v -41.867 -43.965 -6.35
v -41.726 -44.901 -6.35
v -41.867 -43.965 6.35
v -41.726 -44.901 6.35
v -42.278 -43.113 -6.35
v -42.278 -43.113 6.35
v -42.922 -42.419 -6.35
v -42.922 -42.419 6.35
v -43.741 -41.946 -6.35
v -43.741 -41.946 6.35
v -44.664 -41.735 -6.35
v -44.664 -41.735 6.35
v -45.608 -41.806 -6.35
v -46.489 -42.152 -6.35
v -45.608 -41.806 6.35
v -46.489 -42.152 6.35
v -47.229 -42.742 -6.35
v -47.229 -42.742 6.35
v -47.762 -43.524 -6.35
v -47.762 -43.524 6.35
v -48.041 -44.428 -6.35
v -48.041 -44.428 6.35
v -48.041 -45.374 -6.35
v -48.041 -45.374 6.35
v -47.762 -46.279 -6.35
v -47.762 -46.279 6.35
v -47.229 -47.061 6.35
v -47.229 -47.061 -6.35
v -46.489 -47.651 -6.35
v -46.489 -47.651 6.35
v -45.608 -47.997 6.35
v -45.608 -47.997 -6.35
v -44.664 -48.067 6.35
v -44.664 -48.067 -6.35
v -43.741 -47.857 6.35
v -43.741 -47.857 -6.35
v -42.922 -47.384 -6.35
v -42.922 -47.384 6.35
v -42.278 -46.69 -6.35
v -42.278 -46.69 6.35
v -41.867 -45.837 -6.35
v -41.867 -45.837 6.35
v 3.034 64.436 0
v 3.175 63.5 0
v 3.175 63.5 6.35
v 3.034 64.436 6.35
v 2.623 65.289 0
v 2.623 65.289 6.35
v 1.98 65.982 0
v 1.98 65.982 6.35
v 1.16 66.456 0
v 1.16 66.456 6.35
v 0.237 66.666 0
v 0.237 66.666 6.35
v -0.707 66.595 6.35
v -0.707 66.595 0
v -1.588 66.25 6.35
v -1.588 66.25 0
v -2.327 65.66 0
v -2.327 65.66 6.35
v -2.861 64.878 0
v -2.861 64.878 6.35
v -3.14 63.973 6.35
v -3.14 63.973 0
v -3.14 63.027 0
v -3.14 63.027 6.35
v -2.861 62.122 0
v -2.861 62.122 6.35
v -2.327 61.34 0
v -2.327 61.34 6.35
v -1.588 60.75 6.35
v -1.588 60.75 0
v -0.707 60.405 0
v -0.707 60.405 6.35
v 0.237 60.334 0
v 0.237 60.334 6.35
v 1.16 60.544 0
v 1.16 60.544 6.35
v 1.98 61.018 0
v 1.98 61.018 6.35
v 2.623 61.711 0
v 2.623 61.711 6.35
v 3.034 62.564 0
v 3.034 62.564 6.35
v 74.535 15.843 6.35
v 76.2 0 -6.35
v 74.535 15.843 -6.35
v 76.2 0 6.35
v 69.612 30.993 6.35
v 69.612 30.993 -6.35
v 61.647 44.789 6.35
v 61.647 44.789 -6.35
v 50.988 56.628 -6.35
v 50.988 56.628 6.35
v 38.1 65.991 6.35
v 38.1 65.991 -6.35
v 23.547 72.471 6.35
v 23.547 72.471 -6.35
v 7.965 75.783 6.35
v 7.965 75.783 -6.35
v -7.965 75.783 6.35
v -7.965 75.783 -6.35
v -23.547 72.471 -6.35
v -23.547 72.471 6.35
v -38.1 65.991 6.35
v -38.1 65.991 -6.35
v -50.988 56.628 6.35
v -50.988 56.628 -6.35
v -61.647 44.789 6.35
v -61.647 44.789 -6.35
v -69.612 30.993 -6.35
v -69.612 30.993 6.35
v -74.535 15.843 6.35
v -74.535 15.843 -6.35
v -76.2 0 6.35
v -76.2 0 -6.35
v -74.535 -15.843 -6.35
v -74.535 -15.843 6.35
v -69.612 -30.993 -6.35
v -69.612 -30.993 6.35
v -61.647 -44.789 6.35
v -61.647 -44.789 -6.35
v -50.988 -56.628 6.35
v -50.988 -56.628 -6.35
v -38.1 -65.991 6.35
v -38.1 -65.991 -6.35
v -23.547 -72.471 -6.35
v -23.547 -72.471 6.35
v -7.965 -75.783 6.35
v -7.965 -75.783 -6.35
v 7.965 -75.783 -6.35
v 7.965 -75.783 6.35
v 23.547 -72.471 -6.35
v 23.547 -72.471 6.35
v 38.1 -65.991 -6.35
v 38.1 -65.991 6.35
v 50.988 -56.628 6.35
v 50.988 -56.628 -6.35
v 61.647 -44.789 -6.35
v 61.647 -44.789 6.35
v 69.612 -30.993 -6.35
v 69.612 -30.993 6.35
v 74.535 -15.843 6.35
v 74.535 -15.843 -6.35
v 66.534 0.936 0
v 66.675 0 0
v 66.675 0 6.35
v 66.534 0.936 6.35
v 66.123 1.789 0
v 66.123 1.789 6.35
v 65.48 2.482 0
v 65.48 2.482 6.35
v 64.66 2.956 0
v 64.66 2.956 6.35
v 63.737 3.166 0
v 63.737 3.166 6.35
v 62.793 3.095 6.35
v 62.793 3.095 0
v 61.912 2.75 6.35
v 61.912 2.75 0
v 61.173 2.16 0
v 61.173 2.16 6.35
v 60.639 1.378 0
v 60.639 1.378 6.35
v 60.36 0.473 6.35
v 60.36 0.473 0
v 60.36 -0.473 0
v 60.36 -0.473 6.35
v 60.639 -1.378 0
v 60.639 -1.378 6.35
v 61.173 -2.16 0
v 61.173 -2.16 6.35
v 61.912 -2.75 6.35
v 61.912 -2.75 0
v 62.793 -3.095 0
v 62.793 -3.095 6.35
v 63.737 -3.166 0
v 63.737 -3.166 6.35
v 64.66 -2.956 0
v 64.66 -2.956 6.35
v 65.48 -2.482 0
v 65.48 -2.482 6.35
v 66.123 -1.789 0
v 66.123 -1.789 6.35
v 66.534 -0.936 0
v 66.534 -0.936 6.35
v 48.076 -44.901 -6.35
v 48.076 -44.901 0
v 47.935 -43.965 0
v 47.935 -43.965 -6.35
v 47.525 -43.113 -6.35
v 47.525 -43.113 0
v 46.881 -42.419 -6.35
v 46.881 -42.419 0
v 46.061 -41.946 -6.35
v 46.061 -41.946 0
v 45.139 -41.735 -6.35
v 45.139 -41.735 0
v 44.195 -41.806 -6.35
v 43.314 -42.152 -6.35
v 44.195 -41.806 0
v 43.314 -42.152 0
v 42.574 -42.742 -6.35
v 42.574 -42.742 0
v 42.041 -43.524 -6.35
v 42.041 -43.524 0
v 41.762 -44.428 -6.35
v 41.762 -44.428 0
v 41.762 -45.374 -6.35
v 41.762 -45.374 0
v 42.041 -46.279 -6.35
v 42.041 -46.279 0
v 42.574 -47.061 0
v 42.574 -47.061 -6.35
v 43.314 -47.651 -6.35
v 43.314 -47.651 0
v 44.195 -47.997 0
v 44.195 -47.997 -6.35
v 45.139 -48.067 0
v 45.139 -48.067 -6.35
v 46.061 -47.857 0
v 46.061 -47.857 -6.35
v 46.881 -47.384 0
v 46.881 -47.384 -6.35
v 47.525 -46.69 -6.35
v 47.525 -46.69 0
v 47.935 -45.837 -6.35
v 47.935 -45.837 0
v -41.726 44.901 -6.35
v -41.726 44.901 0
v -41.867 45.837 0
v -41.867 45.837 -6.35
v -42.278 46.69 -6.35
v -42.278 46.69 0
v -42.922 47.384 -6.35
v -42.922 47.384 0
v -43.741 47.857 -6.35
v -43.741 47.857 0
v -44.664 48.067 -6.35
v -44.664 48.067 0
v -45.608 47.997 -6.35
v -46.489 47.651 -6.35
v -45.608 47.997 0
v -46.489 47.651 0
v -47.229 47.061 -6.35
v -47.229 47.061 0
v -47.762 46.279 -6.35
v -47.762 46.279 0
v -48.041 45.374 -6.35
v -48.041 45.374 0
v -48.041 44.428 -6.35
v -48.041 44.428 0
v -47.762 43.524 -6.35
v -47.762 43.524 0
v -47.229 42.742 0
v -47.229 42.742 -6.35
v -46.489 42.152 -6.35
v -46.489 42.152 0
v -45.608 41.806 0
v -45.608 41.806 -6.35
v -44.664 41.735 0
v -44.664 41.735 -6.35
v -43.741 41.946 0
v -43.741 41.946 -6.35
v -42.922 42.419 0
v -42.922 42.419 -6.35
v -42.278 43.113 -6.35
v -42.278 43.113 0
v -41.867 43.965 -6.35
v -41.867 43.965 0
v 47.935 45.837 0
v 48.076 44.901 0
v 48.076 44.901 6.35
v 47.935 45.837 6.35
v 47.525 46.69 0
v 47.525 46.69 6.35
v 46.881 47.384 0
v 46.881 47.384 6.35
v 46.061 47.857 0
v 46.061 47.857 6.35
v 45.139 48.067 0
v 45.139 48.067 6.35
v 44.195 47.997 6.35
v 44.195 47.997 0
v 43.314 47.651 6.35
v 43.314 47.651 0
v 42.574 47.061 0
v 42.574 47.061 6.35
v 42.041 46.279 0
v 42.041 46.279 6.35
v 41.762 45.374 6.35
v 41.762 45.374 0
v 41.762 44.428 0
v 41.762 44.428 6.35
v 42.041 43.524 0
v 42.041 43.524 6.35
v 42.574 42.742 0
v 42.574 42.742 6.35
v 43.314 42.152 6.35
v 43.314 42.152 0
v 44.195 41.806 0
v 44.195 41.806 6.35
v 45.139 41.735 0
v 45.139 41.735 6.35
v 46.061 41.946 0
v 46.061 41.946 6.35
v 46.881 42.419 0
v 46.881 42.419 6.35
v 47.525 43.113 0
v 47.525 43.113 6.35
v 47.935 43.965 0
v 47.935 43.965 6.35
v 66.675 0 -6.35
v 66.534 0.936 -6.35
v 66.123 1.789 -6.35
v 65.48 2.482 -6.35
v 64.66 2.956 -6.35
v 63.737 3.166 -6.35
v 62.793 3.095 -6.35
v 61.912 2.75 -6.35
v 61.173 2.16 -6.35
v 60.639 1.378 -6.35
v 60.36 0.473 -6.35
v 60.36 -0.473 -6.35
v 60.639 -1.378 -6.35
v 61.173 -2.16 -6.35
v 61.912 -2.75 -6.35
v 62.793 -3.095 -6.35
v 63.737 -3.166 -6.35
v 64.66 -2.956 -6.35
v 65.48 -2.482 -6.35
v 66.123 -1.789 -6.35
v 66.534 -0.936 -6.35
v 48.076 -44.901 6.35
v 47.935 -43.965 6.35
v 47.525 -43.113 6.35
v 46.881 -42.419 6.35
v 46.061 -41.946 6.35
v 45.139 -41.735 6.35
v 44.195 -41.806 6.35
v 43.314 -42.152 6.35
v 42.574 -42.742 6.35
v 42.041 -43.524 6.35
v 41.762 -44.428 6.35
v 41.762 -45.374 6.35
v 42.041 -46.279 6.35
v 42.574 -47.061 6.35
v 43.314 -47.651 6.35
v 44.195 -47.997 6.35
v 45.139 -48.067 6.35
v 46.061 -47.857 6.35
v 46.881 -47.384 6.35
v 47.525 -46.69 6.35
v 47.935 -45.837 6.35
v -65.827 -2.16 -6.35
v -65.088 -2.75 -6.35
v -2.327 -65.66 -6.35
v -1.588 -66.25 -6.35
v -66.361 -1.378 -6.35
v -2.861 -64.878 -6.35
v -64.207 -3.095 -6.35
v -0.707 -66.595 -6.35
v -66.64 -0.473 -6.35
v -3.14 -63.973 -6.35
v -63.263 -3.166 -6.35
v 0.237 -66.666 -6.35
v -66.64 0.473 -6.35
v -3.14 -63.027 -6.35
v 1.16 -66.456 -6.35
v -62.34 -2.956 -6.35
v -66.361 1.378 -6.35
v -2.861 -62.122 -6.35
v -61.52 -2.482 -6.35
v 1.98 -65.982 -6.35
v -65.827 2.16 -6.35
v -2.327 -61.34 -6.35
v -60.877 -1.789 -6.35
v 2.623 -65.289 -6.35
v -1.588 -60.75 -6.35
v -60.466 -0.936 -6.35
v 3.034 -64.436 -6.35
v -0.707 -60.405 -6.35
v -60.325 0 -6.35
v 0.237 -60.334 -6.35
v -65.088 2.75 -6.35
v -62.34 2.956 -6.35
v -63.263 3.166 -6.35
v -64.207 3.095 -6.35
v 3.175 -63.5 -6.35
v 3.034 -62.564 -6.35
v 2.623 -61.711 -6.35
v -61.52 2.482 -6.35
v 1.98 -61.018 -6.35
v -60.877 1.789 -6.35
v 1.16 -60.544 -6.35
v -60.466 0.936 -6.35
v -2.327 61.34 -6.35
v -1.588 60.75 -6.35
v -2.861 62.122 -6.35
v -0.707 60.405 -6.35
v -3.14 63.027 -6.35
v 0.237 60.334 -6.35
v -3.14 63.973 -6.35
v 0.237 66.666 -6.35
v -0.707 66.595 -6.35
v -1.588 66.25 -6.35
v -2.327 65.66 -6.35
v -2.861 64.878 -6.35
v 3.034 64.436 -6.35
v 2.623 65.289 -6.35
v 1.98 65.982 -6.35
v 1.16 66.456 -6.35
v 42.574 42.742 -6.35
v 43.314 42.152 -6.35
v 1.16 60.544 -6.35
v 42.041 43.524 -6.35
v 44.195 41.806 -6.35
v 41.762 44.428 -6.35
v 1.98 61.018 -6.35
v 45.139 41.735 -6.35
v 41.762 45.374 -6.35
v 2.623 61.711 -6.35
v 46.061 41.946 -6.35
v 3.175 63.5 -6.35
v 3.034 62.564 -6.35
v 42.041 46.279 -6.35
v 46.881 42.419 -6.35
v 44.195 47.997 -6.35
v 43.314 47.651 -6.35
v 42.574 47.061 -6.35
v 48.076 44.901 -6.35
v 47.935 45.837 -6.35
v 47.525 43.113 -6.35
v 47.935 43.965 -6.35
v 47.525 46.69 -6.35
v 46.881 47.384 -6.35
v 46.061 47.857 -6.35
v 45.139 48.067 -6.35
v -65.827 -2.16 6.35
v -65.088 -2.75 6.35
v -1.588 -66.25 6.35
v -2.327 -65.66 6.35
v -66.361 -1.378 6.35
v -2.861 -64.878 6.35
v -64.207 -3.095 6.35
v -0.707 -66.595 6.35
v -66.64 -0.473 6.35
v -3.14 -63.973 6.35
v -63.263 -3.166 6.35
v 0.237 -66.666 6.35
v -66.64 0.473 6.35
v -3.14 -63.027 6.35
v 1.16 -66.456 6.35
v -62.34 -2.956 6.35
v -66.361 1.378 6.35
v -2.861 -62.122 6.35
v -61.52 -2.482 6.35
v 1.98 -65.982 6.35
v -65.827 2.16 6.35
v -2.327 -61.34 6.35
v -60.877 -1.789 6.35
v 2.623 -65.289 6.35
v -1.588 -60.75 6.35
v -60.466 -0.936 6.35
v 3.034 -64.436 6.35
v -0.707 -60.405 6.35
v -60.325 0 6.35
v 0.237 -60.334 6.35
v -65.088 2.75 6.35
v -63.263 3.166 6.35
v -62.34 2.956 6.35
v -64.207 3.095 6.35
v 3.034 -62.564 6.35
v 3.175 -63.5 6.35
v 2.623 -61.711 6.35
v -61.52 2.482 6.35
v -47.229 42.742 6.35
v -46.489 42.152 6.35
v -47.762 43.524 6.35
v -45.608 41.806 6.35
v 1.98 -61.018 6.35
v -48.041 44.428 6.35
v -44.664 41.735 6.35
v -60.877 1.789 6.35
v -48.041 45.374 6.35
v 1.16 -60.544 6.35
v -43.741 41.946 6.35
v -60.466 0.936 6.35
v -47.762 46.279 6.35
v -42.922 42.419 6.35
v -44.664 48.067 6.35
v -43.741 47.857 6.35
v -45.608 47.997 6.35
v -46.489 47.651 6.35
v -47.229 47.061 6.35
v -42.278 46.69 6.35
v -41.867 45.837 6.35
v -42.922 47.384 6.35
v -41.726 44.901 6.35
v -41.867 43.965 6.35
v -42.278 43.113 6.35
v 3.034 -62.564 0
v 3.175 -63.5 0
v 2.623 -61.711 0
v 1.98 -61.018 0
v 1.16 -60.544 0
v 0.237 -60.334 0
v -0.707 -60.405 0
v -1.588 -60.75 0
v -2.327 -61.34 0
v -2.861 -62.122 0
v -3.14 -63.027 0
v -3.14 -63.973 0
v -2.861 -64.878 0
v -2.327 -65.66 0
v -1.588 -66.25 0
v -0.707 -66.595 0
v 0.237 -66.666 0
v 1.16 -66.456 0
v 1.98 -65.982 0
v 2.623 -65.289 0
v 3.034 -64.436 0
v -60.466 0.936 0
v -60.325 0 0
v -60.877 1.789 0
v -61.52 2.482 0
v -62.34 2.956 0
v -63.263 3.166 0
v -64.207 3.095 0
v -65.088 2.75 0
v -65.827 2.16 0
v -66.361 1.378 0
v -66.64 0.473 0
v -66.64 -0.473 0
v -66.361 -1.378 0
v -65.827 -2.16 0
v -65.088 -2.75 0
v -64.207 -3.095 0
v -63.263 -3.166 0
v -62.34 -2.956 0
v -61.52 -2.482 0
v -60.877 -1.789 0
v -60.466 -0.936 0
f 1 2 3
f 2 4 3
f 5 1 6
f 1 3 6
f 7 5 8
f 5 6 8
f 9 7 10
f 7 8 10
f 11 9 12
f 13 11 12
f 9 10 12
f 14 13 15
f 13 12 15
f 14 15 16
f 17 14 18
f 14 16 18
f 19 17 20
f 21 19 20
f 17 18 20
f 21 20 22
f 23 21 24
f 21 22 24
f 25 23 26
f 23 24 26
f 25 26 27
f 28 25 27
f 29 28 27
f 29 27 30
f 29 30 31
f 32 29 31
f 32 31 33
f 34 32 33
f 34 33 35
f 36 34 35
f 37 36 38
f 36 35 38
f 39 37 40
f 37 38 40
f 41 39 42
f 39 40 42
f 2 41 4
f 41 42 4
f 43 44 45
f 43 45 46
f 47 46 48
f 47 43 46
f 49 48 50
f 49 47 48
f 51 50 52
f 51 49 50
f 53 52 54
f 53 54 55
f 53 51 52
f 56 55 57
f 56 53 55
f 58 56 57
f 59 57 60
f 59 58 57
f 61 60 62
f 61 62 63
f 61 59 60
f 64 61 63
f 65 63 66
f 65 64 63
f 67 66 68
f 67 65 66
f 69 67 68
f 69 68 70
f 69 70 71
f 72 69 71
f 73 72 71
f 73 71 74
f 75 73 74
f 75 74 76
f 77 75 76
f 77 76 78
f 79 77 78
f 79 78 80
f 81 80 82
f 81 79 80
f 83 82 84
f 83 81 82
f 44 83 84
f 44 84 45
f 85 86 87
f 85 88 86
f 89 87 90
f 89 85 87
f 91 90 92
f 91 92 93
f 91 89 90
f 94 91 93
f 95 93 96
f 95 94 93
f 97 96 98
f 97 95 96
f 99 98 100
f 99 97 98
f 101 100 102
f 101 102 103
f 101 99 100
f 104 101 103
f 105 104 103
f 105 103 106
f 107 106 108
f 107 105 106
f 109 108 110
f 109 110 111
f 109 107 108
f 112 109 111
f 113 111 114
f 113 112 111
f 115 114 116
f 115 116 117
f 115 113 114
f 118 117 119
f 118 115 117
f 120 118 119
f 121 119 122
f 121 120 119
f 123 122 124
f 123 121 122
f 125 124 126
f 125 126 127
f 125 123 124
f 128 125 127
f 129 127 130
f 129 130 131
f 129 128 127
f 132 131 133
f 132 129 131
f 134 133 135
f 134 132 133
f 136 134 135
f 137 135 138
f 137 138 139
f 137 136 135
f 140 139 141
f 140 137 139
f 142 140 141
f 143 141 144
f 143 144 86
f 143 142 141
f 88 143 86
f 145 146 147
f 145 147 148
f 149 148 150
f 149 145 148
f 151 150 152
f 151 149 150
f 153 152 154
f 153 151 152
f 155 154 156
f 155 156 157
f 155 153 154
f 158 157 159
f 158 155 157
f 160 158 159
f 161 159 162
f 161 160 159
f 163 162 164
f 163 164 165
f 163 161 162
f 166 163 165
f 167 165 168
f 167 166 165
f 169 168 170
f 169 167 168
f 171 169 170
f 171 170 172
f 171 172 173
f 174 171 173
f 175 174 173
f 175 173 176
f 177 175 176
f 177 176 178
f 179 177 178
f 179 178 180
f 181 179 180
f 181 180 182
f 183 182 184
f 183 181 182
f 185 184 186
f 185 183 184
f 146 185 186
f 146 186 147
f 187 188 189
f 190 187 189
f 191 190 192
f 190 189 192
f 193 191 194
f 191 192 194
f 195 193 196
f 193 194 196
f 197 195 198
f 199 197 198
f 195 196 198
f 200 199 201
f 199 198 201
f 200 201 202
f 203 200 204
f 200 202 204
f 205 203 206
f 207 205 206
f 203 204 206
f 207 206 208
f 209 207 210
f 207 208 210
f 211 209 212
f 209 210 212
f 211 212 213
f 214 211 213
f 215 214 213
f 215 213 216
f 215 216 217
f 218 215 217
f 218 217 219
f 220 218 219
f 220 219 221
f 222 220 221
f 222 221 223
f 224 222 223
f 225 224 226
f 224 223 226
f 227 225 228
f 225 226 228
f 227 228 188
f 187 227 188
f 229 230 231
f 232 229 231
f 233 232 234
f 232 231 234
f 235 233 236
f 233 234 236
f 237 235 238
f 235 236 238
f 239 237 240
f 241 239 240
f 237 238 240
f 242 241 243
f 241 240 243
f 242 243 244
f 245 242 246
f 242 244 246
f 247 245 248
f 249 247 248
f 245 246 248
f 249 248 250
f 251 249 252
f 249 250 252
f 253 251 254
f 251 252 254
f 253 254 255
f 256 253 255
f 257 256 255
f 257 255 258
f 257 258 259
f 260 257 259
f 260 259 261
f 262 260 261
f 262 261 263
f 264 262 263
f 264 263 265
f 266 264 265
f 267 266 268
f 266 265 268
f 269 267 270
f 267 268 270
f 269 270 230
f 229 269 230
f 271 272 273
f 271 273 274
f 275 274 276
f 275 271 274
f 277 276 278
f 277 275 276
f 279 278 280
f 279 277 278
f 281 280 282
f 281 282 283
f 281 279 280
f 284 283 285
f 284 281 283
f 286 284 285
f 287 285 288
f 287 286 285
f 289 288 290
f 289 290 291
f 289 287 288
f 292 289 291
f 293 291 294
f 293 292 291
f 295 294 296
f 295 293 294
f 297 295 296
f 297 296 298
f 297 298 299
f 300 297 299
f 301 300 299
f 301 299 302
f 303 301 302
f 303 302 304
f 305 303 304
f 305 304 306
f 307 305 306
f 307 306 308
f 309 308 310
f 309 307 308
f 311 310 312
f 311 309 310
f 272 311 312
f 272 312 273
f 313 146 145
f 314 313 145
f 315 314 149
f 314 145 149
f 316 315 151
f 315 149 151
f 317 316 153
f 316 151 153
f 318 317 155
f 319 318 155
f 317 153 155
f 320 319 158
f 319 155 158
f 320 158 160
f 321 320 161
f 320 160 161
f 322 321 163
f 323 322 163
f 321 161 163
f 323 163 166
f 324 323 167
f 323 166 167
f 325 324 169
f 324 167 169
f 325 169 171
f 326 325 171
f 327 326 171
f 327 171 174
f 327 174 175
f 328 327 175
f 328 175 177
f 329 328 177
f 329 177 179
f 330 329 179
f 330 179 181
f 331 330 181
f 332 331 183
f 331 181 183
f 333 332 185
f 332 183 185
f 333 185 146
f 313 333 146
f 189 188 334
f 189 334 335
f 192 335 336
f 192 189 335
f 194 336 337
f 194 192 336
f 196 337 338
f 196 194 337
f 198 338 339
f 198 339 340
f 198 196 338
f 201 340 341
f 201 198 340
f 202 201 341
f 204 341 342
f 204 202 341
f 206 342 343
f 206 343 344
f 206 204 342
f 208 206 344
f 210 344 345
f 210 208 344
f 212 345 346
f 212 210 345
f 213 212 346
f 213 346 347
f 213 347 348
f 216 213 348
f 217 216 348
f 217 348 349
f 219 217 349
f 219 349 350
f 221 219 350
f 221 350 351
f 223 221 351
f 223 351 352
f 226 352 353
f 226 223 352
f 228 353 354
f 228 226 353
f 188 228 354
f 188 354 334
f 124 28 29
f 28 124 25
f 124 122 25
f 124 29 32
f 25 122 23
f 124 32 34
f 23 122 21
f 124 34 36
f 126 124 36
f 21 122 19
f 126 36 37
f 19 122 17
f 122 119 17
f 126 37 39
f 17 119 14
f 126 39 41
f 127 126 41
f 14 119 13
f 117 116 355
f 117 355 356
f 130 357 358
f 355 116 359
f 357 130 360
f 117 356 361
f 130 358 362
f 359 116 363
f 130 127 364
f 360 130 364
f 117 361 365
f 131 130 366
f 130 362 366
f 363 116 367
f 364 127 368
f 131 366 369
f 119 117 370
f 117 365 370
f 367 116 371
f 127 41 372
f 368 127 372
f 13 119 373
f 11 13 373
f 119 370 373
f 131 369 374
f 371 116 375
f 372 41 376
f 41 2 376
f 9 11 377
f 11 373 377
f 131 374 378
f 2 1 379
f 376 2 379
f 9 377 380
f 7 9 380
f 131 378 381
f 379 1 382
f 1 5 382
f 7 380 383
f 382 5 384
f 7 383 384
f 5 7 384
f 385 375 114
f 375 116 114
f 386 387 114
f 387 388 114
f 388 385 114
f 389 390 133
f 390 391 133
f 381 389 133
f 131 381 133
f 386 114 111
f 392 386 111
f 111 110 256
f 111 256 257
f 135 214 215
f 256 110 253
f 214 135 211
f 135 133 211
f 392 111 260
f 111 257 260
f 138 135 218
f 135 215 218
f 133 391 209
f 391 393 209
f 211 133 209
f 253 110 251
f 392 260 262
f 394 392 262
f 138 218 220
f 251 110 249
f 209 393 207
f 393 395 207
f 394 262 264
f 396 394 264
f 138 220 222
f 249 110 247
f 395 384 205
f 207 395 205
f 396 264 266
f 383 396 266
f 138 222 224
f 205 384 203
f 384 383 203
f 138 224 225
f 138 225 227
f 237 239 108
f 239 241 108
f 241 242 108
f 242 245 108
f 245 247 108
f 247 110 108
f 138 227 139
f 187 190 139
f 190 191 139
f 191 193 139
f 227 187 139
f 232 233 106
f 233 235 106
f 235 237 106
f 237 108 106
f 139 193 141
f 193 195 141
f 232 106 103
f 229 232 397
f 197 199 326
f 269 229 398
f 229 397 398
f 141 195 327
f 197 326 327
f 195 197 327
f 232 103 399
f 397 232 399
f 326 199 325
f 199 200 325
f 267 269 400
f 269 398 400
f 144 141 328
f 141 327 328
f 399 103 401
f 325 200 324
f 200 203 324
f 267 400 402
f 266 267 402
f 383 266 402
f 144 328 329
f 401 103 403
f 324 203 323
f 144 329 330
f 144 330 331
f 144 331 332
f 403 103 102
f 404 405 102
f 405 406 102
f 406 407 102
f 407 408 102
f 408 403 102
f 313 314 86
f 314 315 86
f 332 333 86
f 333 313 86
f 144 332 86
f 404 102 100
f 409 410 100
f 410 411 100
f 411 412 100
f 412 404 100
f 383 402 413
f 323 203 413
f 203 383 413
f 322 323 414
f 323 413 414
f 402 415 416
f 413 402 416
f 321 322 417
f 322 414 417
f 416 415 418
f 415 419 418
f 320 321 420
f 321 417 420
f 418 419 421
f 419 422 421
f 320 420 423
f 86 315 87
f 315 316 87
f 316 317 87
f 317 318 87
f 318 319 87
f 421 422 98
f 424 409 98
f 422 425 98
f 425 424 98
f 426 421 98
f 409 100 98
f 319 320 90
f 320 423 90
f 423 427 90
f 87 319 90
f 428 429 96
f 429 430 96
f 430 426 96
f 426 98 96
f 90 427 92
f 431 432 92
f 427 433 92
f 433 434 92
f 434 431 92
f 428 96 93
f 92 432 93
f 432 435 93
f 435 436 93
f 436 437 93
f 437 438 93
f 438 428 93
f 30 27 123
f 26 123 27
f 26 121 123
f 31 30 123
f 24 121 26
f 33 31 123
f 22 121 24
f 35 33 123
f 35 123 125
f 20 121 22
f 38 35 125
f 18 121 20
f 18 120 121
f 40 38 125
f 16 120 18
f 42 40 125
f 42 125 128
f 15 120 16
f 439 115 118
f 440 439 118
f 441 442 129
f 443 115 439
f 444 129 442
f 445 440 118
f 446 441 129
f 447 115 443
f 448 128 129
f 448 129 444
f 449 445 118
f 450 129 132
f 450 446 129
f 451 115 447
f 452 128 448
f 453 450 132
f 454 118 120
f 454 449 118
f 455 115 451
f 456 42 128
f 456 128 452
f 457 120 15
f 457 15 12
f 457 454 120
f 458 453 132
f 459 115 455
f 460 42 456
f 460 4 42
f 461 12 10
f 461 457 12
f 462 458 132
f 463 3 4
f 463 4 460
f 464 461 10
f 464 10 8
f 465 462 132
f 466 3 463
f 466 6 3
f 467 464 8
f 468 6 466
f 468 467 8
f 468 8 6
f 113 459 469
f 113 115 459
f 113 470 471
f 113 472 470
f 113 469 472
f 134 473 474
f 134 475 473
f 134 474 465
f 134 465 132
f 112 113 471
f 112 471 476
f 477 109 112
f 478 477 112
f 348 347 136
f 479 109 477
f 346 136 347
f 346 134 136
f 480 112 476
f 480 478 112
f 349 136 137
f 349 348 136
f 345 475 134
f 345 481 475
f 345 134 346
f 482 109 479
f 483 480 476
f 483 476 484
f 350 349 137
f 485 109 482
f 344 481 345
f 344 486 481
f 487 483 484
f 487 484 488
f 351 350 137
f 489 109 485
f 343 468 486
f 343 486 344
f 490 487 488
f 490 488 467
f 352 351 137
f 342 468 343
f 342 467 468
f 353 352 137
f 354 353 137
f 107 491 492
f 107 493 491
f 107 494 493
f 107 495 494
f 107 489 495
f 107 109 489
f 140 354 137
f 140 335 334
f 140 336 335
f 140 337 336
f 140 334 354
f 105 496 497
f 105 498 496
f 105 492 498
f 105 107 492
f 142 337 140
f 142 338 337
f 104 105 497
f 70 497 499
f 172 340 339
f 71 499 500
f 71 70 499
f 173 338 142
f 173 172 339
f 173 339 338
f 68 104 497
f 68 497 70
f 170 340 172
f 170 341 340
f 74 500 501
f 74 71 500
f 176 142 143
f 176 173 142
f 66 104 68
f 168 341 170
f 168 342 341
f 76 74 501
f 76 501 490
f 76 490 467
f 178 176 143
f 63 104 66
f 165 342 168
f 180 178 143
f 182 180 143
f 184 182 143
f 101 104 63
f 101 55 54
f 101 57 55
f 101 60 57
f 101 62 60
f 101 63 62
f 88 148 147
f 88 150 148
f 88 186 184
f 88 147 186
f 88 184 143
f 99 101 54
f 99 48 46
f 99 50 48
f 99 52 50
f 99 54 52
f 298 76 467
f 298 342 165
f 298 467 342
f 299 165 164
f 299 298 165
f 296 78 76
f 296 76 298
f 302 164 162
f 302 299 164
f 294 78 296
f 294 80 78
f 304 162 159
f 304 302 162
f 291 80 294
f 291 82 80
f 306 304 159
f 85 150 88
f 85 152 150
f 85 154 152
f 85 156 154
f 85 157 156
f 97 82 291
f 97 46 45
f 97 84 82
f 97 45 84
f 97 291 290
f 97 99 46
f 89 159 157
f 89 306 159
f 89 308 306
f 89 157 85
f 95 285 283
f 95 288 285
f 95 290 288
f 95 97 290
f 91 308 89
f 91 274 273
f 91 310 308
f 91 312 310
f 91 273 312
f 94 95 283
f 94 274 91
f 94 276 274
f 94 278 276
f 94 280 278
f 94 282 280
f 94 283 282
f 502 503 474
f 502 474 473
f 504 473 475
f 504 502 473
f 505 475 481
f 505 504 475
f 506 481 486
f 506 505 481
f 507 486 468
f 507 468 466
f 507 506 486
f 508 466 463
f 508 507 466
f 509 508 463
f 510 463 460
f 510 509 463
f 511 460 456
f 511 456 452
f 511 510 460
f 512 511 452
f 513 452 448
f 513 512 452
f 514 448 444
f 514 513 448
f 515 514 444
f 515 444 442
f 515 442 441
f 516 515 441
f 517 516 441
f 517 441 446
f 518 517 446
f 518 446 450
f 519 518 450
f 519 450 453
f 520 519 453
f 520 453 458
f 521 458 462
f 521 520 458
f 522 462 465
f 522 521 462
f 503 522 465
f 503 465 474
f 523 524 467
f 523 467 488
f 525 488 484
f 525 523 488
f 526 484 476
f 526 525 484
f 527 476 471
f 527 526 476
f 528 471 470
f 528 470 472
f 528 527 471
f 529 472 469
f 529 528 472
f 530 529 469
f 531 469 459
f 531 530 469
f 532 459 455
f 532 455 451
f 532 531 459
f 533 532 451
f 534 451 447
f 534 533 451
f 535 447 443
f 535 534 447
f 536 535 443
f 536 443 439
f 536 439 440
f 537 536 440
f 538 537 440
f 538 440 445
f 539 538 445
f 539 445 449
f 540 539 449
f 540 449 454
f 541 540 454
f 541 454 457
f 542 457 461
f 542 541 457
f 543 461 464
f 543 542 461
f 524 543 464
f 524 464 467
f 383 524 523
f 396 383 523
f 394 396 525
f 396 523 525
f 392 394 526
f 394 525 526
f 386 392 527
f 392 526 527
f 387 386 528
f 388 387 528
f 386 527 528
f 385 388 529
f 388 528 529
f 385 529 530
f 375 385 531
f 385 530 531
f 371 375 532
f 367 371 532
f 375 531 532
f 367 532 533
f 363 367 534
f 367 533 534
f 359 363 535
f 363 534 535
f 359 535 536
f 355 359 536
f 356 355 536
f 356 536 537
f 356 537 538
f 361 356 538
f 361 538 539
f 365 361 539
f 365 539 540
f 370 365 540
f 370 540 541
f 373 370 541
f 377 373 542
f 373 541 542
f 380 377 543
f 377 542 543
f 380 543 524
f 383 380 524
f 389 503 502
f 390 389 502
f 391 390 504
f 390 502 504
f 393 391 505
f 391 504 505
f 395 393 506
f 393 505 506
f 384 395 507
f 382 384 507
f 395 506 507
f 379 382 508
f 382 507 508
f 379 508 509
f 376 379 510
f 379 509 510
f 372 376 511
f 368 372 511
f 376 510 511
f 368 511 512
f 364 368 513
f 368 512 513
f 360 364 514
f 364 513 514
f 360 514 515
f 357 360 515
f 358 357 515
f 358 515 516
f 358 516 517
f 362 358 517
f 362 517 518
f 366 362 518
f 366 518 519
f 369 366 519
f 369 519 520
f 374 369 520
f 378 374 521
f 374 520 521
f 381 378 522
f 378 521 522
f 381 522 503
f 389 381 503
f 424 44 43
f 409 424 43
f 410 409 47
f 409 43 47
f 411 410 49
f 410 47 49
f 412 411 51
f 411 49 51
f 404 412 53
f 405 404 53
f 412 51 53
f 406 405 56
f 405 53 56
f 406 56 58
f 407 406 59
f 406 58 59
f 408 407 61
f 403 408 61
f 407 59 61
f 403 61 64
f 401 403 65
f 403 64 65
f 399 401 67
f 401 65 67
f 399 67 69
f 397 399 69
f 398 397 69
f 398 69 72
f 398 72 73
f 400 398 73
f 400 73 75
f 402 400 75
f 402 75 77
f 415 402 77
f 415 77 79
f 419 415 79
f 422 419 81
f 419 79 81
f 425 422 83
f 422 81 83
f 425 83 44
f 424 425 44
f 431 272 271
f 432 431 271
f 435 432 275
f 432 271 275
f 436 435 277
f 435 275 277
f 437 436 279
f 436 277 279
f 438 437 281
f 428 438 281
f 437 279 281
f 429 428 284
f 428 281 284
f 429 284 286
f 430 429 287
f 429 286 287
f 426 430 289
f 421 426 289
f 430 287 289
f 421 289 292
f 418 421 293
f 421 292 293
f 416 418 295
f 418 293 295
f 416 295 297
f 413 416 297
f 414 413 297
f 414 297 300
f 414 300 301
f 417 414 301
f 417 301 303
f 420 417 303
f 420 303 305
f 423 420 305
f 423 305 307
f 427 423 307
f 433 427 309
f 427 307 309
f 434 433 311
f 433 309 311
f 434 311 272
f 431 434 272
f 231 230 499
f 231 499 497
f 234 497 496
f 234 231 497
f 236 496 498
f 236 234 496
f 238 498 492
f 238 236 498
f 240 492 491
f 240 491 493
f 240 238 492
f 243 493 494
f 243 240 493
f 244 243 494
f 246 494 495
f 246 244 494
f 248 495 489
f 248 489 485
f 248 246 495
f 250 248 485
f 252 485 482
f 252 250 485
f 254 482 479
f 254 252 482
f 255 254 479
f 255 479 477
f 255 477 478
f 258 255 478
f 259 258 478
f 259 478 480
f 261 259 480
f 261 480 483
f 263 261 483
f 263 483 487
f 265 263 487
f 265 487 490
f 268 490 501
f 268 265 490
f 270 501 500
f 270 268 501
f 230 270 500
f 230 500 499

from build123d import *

# Parameters (mm, degrees)
F0_R     = 76.2
F2_DEPTH = 6.35
F1_R     = 3.175
F3_DEPTH = 6.35


with BuildPart() as f2:
    # F0 (on Top) → F2 (new body, symmetric)
    with BuildSketch(Plane.XY):
        Circle(F0_R)
    extrude(amount=F2_DEPTH, both=True)

    # F1 (on Top) → F3 (cut, symmetric)
    with BuildSketch(Plane.XY):
        with Locations((0, 63.5)):
            Circle(F1_R)
        with Locations((63.5, 0)):
            Circle(F1_R)
        with Locations((-63.5, 0)):
            Circle(F1_R)
        with Locations((0, -63.5)):
            Circle(F1_R)
        with Locations((-44.901281, 44.901281)):
            Circle(F1_R)
        with Locations((44.901281, 44.901281)):
            Circle(F1_R)
        with Locations((44.901281, -44.901281)):
            Circle(F1_R)
        with Locations((-44.901281, -44.901281)):
            Circle(F1_R)
    extrude(amount=F3_DEPTH, both=True, mode=Mode.SUBTRACT)


solid = f2.part
